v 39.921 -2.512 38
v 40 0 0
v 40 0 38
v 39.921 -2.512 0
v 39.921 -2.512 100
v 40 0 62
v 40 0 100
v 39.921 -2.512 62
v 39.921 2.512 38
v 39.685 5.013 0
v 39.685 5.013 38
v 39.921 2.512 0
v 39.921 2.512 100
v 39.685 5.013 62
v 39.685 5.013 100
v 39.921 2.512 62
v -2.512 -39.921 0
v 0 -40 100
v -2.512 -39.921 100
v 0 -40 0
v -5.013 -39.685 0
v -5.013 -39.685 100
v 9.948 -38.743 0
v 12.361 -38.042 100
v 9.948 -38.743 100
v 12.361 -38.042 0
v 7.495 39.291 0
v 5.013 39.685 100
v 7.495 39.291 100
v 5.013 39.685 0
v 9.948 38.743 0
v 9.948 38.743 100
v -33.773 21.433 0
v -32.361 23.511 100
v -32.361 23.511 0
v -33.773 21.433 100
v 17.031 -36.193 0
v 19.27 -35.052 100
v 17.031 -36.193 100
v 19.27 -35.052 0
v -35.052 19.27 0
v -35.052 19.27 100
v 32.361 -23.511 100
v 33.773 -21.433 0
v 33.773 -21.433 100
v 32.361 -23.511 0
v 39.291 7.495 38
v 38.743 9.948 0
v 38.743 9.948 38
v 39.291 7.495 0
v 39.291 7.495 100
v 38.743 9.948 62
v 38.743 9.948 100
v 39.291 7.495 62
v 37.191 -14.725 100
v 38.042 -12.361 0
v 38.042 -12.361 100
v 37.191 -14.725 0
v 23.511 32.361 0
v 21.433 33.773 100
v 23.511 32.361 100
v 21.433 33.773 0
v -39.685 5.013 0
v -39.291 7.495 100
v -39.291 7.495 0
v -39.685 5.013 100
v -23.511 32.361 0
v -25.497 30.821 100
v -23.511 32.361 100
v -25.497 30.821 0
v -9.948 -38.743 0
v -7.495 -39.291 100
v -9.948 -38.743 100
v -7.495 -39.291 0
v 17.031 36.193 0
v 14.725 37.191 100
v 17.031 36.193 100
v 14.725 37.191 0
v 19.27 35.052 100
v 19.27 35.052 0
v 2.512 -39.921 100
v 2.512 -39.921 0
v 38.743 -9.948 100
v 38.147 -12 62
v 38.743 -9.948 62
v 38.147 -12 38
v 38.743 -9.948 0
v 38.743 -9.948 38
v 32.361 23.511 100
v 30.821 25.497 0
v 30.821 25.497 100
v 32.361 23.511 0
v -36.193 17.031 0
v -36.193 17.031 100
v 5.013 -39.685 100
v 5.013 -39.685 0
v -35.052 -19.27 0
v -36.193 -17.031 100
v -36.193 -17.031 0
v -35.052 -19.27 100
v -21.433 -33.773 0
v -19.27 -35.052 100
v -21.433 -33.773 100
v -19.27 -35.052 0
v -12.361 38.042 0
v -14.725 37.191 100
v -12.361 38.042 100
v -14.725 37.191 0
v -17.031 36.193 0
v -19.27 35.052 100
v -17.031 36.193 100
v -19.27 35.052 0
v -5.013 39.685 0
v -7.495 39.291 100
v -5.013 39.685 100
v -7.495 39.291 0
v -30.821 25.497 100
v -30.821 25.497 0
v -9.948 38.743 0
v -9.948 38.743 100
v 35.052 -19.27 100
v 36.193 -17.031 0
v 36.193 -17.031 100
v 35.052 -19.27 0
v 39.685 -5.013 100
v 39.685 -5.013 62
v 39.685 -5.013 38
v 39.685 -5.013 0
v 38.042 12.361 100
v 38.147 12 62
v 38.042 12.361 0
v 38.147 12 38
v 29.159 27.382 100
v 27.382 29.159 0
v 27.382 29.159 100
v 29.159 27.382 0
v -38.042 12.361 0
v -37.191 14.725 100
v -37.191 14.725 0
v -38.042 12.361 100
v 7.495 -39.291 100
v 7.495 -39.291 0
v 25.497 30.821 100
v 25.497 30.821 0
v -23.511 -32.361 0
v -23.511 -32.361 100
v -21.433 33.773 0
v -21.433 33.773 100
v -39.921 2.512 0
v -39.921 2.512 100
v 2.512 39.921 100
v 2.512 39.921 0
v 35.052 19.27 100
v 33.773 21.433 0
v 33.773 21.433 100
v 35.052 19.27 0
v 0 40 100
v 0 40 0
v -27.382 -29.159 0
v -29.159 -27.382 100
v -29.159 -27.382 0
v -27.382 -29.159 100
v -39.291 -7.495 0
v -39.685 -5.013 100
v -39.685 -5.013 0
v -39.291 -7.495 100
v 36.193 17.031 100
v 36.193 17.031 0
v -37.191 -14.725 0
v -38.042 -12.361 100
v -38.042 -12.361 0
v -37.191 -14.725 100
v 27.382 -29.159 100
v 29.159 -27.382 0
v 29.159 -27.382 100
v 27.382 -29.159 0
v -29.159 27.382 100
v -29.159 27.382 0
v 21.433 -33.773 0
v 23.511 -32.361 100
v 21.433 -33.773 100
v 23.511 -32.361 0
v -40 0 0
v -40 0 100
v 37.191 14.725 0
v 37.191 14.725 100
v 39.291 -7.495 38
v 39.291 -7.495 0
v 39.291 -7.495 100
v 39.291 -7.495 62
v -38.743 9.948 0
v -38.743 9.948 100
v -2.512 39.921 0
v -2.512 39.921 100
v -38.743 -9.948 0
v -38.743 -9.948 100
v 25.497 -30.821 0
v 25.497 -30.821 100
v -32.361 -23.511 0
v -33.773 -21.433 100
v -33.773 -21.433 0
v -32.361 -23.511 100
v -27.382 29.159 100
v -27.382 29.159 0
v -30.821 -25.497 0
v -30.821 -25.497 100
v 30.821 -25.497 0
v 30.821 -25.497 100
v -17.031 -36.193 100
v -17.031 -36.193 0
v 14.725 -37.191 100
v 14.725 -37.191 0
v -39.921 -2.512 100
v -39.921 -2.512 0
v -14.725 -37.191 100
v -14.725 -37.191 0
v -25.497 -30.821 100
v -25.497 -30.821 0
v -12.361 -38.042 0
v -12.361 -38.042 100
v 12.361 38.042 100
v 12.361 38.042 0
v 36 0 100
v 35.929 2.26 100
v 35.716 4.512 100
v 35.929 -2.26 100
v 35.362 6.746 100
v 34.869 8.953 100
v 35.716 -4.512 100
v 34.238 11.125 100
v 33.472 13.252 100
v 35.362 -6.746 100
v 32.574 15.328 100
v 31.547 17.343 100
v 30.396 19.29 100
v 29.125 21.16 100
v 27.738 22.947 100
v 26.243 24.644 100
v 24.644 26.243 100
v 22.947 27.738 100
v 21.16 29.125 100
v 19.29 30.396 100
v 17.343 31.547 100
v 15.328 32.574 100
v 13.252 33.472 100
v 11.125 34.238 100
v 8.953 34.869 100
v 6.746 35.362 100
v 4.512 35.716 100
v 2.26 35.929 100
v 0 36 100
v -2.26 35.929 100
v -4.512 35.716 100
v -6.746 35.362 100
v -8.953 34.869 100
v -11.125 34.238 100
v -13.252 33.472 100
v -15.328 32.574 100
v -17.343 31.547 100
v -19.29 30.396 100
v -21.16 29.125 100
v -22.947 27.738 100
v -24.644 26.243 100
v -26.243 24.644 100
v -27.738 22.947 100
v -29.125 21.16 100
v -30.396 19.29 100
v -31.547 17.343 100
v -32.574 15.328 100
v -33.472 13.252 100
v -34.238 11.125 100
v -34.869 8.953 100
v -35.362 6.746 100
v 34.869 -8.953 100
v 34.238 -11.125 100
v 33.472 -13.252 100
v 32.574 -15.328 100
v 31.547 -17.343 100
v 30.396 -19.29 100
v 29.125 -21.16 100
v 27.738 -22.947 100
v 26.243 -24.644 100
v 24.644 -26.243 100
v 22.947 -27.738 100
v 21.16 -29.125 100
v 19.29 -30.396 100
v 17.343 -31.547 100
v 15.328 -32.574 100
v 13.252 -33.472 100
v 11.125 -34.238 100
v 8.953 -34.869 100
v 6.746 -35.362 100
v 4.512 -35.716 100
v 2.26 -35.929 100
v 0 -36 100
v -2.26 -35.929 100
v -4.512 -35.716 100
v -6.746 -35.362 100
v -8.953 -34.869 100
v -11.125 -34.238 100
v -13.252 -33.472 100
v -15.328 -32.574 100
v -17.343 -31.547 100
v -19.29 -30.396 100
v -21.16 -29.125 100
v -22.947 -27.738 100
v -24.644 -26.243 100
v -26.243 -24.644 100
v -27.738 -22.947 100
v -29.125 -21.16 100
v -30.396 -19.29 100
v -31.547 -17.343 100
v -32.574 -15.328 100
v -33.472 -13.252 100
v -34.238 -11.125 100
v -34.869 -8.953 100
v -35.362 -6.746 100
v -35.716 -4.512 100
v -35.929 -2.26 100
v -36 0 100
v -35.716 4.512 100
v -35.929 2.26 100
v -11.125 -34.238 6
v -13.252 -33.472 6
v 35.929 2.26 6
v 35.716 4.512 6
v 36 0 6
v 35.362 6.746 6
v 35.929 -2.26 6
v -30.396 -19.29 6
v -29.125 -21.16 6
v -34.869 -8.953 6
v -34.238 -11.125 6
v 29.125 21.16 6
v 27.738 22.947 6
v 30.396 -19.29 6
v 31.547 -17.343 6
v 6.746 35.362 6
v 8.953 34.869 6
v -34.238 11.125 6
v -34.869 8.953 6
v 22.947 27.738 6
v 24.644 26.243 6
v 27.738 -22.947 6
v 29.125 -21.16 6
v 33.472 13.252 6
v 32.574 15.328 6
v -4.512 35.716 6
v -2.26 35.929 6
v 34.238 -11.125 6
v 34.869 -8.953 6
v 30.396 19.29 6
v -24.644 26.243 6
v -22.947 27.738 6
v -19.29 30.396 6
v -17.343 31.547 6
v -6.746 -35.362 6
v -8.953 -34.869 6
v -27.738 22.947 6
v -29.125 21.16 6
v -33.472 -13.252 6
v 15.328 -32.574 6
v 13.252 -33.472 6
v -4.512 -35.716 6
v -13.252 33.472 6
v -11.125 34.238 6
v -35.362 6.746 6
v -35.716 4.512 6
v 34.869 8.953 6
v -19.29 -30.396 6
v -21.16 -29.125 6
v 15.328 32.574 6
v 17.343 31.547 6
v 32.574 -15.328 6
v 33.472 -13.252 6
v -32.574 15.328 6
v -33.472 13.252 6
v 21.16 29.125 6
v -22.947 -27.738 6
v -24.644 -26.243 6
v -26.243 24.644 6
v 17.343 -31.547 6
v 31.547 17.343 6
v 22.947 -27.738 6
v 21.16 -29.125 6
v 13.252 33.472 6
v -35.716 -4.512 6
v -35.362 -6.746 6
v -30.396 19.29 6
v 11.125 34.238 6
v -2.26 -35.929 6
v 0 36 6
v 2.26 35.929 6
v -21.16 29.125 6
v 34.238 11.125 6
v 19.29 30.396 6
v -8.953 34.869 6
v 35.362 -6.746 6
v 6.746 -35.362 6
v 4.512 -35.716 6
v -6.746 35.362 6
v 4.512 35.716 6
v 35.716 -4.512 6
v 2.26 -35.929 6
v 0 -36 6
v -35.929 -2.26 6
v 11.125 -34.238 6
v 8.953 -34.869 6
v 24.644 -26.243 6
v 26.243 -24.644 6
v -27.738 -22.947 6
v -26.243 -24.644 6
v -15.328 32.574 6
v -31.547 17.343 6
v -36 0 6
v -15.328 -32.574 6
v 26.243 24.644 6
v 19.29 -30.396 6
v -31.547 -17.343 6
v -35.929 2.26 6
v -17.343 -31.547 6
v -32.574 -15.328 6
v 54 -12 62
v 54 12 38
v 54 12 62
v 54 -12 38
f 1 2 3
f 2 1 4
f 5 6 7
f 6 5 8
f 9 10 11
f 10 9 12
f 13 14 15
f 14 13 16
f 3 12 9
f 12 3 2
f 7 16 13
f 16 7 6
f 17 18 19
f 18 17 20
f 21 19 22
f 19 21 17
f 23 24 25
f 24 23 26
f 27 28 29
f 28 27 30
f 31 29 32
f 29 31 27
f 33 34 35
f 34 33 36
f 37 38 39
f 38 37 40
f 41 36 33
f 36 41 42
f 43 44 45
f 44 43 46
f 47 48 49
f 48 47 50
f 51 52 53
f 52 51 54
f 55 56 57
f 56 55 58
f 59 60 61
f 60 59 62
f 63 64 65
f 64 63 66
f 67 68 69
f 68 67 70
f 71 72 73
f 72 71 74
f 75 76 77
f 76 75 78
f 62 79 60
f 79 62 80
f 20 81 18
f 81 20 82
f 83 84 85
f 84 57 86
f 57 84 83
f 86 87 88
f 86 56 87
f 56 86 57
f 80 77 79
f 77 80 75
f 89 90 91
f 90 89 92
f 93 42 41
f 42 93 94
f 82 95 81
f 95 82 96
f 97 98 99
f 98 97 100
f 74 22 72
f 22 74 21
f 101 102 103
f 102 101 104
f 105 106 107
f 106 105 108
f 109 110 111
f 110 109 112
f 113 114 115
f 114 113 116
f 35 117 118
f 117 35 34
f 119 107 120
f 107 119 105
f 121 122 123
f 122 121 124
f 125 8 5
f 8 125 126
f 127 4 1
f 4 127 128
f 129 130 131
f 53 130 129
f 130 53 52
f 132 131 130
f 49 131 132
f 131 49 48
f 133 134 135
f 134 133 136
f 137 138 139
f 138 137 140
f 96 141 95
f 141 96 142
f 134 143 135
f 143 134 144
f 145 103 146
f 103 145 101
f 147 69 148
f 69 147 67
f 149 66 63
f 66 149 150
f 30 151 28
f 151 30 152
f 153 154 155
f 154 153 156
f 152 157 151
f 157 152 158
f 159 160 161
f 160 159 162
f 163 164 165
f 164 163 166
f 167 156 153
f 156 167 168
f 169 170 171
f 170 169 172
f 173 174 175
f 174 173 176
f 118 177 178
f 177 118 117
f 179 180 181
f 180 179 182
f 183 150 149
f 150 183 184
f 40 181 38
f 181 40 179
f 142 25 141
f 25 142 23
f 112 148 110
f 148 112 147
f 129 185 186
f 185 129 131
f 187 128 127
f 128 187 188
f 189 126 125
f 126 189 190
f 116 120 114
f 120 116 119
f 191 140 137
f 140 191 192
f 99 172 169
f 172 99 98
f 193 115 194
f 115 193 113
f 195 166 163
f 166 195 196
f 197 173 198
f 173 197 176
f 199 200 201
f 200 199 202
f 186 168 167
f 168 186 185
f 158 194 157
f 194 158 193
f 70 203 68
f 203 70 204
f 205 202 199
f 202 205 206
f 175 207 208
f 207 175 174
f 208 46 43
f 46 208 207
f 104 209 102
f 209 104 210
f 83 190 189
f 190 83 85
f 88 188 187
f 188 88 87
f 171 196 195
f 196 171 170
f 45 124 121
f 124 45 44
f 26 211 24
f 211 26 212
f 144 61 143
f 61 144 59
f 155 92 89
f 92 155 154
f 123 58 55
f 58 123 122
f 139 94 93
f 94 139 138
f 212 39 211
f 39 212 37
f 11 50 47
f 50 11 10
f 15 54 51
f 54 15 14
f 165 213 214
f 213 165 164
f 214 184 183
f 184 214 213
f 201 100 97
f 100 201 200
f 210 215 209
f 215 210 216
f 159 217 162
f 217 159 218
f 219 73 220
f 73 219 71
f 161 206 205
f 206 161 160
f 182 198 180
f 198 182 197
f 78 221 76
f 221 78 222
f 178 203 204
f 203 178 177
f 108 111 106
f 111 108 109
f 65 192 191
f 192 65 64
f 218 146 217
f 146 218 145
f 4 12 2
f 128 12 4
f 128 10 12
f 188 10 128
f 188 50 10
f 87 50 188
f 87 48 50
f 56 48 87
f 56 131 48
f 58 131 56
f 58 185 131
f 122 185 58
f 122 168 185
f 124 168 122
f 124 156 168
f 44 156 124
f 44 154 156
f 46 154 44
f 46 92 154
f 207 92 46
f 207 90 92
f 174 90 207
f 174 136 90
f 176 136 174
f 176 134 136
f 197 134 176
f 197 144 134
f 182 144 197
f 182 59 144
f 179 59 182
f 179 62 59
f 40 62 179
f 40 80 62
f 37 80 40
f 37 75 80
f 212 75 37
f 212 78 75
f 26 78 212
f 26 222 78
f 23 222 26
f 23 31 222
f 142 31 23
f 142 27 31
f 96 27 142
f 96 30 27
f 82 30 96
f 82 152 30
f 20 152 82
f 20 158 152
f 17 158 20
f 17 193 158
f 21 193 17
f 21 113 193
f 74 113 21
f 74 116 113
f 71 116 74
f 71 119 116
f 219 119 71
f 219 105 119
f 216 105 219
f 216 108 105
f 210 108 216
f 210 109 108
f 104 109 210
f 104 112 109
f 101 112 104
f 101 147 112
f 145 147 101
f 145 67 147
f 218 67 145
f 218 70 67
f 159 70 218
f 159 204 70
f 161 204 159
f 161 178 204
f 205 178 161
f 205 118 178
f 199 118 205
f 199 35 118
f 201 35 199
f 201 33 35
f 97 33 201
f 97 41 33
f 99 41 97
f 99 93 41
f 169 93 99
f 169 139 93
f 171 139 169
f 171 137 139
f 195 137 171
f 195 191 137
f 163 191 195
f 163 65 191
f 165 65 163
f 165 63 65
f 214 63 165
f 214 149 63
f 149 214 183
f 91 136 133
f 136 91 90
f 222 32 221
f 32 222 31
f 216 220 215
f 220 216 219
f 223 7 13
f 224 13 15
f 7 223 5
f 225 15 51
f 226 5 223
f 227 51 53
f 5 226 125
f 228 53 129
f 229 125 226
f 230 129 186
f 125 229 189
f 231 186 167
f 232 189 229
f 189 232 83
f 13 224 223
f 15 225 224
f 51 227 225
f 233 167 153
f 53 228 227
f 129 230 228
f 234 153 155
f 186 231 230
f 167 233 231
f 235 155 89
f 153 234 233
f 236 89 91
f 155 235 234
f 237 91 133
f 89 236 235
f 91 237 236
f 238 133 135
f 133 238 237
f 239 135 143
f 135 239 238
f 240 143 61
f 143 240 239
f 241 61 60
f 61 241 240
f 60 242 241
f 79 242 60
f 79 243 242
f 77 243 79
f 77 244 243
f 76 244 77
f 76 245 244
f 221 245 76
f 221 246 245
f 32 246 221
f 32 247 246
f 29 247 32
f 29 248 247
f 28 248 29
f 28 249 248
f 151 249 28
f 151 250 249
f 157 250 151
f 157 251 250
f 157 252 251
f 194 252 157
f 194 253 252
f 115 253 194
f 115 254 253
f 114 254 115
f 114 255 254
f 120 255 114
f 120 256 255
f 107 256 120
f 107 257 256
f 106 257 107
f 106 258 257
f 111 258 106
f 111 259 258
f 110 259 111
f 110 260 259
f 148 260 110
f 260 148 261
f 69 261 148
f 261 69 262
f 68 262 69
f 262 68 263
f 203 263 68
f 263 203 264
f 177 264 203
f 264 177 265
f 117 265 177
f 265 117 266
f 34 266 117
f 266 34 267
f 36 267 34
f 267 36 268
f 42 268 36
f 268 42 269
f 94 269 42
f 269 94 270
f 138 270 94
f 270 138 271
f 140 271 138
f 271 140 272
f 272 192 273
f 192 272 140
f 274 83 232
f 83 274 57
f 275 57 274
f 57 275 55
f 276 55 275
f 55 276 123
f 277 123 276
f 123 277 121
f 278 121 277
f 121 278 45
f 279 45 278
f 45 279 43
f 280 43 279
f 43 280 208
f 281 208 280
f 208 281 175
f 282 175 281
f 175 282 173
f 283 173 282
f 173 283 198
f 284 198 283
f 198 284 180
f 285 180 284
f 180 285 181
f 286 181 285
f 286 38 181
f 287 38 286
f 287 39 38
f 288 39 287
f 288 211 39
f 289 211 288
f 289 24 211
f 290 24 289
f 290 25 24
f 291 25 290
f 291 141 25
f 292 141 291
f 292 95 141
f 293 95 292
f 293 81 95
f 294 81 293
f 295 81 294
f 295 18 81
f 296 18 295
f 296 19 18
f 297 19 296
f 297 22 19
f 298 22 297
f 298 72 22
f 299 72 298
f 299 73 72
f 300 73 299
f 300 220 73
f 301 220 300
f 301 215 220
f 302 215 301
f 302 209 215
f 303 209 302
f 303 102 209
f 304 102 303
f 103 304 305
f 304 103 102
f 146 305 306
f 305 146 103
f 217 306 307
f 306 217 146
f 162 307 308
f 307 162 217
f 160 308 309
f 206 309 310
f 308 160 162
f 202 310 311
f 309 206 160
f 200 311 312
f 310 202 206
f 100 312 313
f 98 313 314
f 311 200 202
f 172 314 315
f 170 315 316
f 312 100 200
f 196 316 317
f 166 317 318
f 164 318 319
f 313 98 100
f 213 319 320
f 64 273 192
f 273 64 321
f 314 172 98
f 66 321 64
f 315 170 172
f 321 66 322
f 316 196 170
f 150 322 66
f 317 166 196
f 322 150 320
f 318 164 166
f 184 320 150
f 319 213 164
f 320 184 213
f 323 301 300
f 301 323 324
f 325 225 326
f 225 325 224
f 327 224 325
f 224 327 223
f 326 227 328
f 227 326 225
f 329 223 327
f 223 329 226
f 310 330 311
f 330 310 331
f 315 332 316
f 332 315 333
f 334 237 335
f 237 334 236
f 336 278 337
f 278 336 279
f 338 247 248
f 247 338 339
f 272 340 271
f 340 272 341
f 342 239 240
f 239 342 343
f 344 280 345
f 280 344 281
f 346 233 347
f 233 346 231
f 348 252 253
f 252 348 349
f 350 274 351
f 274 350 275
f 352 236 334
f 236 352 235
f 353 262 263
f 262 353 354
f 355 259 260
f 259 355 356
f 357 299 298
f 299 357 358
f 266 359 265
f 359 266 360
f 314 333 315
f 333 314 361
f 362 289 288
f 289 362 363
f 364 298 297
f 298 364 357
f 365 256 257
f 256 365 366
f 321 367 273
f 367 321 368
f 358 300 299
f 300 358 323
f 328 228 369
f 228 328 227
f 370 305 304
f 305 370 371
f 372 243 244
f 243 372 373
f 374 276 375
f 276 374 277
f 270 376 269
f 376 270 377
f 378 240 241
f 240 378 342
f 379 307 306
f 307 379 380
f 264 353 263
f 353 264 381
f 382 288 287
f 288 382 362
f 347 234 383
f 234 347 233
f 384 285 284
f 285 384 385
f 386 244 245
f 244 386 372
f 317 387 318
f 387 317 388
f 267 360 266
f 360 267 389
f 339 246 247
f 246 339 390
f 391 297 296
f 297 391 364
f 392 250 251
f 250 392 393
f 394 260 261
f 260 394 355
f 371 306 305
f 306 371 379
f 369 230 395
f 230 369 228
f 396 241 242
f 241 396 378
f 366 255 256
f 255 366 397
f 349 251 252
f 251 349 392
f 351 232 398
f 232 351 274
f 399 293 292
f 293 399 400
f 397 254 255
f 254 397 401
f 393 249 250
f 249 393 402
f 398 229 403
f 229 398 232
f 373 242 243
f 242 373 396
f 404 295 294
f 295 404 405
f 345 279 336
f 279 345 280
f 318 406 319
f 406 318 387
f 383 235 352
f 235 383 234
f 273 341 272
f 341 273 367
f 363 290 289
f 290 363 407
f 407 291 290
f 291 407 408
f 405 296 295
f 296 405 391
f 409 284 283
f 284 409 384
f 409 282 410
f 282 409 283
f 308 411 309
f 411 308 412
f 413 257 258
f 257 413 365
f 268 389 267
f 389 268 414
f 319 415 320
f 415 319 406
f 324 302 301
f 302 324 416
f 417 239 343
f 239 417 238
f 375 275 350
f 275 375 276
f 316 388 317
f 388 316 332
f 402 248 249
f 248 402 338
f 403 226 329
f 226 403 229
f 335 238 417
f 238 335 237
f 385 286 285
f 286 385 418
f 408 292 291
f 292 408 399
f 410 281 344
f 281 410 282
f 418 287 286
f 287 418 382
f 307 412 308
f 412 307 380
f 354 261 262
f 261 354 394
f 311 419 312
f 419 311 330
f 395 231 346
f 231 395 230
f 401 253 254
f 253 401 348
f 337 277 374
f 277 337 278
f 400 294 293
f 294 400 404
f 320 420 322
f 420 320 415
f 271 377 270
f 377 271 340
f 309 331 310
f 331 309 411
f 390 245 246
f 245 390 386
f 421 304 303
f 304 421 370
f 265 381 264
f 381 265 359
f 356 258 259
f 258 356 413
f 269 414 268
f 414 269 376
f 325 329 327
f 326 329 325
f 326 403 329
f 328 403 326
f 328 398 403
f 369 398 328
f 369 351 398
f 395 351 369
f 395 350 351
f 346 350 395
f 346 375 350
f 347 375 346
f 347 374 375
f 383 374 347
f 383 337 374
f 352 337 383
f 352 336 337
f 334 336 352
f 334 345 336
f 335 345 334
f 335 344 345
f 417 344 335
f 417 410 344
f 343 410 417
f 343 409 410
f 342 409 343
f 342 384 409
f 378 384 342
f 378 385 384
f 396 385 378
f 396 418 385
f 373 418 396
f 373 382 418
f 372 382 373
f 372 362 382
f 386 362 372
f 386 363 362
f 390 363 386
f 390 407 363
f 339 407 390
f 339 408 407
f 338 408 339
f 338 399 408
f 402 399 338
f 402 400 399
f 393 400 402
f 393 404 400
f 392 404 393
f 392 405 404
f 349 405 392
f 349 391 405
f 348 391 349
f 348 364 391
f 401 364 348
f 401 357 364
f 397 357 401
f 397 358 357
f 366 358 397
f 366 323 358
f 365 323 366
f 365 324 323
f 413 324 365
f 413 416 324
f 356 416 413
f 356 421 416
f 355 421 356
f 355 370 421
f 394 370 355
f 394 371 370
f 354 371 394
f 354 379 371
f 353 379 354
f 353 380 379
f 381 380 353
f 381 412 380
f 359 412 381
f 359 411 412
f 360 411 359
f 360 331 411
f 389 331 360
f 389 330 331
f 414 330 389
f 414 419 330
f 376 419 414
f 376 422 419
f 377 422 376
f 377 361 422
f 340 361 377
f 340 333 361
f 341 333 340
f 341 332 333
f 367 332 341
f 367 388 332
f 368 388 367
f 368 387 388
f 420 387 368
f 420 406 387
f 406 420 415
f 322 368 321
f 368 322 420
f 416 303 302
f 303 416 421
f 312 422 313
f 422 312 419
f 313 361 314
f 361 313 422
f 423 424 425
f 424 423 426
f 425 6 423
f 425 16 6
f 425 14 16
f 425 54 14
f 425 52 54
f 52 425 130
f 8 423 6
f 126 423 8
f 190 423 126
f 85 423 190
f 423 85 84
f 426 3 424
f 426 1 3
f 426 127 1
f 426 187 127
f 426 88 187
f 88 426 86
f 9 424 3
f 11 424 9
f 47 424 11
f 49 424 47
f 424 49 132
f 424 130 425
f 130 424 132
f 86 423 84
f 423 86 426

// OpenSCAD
// マグカップのパラメータ
outer_diameter = 80;
outer_radius = outer_diameter / 2;
height = 100;
wall_thickness = 4;
bottom_thickness = 6;
handle_radius = 12;

// マグカップ本体
difference() {
    // 外側の円柱
    cylinder(h = height, r = outer_radius, $fn = 100);
    
    // 内側をくり抜く
    translate([0, 0, bottom_thickness])
        cylinder(h = height - bottom_thickness + 1, r = outer_radius - wall_thickness, $fn = 100);
}

// 取手
difference() {
    union() {
        // 取手本体（トーラス）
        translate([outer_radius + handle_radius, 0, height / 2])
            rotate([90, 0, 0])
                rotate_extrude($fn = 100)
                    translate([handle_radius, 0, 0])
                        circle(r = handle_radius, $fn = 50);
        
        // カップと取手の接続部分
        translate([outer_radius - wall_thickness/2, -handle_radius, height/2 - handle_radius])
            cube([wall_thickness + handle_radius, handle_radius * 2, handle_radius * 2]);
    }
    
    // カップ本体の形状で切り取る（きれいな接続のため）
    cylinder(h = height, r = outer_radius - wall_thickness - 0.01, $fn = 100);
}
